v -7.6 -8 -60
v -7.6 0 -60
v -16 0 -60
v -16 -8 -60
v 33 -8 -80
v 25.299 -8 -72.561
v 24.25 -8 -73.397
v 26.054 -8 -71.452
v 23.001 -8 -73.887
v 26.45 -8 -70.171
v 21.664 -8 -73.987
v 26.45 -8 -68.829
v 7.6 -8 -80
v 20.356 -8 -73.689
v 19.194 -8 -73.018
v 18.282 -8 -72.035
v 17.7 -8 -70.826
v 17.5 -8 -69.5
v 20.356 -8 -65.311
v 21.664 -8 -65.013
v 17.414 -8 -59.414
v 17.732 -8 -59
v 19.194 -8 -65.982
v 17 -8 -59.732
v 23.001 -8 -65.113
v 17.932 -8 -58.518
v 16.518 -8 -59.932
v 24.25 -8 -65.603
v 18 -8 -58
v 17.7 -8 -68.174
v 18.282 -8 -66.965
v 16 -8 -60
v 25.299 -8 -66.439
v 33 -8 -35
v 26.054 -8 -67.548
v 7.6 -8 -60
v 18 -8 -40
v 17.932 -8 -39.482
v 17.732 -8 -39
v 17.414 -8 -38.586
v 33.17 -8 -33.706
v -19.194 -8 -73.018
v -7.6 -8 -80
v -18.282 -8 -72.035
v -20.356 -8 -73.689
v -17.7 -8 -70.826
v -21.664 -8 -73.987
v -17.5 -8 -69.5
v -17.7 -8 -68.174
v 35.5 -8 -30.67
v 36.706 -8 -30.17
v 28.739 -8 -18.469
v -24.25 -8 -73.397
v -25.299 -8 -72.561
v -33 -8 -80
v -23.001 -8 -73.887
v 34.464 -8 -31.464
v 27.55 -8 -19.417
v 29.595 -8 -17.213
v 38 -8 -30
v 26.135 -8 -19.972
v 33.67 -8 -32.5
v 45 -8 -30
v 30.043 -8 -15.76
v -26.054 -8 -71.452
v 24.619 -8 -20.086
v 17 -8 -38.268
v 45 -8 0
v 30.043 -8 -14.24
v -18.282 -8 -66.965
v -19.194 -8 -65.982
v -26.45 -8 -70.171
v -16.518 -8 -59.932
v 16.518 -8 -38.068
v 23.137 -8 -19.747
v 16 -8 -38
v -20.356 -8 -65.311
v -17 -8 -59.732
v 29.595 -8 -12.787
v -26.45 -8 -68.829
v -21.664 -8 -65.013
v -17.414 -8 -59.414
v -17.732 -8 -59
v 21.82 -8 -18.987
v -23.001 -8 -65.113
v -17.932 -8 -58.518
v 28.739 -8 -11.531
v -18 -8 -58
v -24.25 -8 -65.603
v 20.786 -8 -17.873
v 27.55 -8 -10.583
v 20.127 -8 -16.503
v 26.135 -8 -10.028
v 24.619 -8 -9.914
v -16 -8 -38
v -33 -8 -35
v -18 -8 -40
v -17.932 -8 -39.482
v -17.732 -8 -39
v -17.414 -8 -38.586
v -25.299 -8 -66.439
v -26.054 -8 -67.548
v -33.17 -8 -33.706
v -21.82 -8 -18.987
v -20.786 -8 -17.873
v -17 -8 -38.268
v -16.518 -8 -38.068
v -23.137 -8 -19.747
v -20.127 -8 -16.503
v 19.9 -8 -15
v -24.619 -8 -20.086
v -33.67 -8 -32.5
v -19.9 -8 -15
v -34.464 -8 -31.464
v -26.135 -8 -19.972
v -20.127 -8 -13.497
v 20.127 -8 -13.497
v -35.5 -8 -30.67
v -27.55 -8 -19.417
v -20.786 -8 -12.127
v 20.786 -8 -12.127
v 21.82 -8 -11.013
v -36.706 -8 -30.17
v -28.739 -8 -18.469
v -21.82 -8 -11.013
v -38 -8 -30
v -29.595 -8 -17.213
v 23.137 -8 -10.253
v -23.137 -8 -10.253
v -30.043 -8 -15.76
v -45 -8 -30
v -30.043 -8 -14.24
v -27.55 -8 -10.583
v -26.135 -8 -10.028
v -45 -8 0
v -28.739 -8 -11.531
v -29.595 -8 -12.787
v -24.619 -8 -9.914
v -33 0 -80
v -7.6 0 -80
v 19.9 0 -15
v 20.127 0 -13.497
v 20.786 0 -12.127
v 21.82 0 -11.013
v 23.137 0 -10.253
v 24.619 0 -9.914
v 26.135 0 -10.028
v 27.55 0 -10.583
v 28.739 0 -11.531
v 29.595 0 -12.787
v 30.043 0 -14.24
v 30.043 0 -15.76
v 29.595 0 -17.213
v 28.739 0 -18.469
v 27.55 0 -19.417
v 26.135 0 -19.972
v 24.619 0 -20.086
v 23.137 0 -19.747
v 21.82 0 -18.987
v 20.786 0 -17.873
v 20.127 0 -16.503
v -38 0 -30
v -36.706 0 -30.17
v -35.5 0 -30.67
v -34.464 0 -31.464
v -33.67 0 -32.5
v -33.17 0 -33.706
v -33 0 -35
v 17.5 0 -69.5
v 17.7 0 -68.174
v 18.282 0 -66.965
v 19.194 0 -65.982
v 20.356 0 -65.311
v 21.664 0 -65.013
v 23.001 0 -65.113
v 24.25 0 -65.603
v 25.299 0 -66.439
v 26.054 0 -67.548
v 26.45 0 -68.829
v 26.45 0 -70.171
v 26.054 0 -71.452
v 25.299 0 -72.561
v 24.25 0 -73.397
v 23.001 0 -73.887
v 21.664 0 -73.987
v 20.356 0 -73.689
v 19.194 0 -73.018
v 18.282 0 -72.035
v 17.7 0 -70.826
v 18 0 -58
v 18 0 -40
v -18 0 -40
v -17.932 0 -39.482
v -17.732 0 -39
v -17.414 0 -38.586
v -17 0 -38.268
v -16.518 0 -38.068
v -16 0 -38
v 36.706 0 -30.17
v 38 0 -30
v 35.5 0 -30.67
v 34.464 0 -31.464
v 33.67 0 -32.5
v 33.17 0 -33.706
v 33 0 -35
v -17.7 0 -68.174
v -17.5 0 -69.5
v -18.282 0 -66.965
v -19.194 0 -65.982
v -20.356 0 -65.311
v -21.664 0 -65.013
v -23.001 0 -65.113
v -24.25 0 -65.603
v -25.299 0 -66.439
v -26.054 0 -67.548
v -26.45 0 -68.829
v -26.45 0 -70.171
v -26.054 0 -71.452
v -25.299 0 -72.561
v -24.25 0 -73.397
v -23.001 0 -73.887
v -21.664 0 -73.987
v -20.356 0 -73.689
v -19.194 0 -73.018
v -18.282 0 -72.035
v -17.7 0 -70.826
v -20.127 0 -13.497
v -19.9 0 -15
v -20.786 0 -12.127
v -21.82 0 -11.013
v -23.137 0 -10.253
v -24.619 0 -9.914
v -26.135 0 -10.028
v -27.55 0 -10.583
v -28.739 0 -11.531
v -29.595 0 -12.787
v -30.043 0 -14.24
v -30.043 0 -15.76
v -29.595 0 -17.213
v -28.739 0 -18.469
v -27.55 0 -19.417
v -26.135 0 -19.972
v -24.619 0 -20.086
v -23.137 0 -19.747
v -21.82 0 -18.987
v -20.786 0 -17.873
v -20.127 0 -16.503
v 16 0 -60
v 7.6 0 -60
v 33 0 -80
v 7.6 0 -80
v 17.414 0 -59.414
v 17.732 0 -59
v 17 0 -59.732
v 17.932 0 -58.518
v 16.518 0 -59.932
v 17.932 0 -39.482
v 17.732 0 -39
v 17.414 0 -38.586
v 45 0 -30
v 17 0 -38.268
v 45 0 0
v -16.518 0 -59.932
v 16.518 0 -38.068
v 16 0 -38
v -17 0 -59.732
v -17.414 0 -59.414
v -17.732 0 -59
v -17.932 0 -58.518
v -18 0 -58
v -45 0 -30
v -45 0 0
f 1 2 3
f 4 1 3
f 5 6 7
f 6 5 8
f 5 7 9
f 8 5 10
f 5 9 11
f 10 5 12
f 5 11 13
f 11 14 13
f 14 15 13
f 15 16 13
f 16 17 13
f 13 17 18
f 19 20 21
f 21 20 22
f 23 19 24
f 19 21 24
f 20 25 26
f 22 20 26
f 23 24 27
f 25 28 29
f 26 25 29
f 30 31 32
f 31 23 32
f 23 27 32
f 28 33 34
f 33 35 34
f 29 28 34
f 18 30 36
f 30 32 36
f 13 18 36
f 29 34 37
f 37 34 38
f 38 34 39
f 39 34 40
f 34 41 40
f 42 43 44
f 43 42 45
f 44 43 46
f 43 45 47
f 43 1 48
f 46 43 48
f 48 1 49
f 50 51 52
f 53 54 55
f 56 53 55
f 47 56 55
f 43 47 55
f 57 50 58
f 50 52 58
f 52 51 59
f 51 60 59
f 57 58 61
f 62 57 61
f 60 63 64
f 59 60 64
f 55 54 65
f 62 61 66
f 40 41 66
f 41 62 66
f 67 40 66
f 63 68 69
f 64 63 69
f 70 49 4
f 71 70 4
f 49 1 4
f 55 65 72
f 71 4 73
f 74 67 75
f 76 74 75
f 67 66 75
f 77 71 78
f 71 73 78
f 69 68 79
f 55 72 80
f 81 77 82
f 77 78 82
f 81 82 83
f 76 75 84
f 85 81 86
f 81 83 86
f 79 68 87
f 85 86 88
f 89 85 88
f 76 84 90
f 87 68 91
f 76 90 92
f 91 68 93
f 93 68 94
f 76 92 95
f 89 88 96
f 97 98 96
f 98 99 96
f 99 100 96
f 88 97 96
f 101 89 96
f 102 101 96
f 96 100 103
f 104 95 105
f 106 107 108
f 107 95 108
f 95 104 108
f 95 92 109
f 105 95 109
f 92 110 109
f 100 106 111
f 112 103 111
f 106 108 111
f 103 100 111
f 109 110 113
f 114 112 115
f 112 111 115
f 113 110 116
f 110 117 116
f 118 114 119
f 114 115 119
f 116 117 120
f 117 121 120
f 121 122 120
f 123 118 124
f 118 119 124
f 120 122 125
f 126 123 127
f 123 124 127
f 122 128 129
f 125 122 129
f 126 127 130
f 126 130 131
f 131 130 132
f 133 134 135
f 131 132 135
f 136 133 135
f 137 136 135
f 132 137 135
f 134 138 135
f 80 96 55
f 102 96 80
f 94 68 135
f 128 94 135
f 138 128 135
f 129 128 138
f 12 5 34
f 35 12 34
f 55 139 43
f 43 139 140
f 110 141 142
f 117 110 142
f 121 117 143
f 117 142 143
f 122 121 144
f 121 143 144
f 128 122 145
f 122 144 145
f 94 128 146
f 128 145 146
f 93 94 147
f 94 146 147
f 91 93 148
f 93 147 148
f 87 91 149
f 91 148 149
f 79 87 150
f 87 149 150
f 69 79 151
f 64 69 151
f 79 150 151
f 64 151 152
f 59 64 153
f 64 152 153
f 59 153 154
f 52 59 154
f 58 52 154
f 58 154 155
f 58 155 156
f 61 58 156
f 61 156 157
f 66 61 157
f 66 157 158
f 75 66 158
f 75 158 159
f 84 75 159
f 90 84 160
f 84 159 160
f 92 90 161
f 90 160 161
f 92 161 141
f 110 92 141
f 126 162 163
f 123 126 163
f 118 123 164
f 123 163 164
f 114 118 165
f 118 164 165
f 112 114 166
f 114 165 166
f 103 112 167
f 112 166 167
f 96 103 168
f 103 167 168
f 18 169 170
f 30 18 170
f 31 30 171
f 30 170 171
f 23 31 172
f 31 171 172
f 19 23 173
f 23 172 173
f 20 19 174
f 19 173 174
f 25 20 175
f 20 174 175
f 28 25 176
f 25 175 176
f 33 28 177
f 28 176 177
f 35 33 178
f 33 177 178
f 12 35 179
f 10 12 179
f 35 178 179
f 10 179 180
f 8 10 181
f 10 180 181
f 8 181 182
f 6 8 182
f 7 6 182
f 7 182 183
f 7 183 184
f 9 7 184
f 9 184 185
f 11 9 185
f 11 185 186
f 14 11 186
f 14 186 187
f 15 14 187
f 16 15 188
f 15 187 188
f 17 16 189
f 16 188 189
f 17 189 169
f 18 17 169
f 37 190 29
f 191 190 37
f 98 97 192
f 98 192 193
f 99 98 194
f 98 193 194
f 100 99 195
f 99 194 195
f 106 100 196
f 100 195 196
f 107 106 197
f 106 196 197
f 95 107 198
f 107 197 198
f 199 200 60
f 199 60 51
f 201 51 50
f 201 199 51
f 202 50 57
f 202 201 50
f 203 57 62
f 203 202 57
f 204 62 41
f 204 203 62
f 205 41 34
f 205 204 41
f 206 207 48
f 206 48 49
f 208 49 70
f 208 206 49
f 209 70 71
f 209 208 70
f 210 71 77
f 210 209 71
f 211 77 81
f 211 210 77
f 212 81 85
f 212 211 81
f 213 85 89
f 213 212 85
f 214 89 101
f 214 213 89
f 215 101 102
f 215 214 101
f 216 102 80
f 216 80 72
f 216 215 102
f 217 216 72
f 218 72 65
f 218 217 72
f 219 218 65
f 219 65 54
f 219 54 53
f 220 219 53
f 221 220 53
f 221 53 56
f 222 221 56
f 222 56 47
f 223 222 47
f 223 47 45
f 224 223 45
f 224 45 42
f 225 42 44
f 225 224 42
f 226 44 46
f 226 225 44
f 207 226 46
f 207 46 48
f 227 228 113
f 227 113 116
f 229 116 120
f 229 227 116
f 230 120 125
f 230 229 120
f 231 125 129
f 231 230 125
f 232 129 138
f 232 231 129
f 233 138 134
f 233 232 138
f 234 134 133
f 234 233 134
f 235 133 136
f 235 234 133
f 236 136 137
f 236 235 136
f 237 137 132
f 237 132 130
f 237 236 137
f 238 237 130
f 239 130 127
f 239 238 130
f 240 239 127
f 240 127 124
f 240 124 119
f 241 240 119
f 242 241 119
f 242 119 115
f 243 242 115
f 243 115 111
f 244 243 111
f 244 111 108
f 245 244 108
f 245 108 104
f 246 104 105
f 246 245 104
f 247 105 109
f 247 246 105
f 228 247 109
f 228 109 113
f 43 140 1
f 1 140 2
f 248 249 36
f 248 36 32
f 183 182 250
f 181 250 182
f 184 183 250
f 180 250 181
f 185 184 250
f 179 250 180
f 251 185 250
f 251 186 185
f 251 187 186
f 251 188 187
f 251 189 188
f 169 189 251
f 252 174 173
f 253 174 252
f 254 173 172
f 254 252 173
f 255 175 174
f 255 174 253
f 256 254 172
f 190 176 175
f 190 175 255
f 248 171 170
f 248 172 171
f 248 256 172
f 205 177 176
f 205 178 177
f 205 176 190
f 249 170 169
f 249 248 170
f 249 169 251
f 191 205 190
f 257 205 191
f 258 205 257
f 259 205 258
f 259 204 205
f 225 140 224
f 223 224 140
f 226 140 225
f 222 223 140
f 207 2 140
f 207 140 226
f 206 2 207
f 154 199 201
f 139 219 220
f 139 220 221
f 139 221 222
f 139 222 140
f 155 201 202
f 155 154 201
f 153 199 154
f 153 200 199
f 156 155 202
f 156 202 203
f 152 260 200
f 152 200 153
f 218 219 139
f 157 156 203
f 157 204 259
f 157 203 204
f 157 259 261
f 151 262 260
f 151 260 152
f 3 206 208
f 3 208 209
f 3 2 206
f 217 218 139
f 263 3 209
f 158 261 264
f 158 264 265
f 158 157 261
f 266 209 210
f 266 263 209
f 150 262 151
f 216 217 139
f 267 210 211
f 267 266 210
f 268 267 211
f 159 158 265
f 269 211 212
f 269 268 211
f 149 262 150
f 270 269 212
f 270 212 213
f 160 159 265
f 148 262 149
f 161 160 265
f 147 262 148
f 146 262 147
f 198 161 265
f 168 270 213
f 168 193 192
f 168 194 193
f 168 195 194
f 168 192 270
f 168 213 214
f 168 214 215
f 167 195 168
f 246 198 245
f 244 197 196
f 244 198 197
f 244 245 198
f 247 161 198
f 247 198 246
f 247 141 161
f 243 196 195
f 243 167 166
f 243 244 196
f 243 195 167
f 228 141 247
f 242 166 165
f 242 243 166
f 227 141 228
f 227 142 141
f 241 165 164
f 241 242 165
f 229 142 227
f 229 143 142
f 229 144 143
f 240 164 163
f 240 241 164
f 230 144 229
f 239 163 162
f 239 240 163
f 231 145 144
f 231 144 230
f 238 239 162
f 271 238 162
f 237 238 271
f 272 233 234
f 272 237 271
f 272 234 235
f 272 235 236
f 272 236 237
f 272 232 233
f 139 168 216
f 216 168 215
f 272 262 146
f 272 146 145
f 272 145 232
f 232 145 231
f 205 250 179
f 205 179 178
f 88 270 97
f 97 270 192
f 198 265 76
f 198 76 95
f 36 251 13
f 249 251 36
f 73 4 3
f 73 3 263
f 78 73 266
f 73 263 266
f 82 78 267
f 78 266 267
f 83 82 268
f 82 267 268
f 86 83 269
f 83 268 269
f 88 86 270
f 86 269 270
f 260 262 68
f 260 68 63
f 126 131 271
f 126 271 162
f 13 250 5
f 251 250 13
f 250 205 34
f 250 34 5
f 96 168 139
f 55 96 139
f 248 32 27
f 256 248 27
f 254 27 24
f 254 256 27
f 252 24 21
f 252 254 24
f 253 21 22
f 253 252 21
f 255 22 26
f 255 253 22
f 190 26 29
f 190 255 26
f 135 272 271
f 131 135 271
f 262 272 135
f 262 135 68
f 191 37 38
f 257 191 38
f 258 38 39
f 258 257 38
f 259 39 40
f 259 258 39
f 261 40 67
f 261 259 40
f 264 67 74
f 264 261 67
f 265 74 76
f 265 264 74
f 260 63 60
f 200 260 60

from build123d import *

# Parameters (mm, degrees)
F0_R     = 4.5
F0_R_2   = 5.1
F1_DEPTH = 8


with BuildPart() as f1:
    # F0 (on Front) → F1 (new body)
    with BuildSketch(Plane.XZ):
        with BuildLine():
            Line((0, -38), (0, 0))
            Line((0, 0), (-45, 0))
            Line((-45, 0), (-45, -30))
            Line((-45, -30), (-38, -30))
            ThreePointArc((-38, -30), (-34.464466, -31.464466), (-33, -35))
            Line((-33, -35), (-33, -80))
            Line((-33, -80), (-7.6, -80))
            Line((-7.6, -80), (-7.6, -60))
            Line((-7.6, -60), (-16, -60))
            ThreePointArc((-16, -60), (-17.414214, -59.414214), (-18, -58))
            Line((-18, -58), (-18, -40))
            ThreePointArc((-18, -40), (-17.414214, -38.585786), (-16, -38))
            Line((-16, -38), (0, -38))
        make_face()
        with Locations((-22, -69.5)):
            Circle(F0_R, mode=Mode.SUBTRACT)
        with Locations((-25, -15)):
            Circle(F0_R_2, mode=Mode.SUBTRACT)
    extrude(amount=F1_DEPTH)

    # F2: F1 across face


with BuildPart() as f1_1:
    add(f1.part)
    add(f1.part.mirror(Plane(origin=(0, -4, -19), x_dir=(0, 1, 0), z_dir=(1, 0, 0))))


solid = f1_1.part
